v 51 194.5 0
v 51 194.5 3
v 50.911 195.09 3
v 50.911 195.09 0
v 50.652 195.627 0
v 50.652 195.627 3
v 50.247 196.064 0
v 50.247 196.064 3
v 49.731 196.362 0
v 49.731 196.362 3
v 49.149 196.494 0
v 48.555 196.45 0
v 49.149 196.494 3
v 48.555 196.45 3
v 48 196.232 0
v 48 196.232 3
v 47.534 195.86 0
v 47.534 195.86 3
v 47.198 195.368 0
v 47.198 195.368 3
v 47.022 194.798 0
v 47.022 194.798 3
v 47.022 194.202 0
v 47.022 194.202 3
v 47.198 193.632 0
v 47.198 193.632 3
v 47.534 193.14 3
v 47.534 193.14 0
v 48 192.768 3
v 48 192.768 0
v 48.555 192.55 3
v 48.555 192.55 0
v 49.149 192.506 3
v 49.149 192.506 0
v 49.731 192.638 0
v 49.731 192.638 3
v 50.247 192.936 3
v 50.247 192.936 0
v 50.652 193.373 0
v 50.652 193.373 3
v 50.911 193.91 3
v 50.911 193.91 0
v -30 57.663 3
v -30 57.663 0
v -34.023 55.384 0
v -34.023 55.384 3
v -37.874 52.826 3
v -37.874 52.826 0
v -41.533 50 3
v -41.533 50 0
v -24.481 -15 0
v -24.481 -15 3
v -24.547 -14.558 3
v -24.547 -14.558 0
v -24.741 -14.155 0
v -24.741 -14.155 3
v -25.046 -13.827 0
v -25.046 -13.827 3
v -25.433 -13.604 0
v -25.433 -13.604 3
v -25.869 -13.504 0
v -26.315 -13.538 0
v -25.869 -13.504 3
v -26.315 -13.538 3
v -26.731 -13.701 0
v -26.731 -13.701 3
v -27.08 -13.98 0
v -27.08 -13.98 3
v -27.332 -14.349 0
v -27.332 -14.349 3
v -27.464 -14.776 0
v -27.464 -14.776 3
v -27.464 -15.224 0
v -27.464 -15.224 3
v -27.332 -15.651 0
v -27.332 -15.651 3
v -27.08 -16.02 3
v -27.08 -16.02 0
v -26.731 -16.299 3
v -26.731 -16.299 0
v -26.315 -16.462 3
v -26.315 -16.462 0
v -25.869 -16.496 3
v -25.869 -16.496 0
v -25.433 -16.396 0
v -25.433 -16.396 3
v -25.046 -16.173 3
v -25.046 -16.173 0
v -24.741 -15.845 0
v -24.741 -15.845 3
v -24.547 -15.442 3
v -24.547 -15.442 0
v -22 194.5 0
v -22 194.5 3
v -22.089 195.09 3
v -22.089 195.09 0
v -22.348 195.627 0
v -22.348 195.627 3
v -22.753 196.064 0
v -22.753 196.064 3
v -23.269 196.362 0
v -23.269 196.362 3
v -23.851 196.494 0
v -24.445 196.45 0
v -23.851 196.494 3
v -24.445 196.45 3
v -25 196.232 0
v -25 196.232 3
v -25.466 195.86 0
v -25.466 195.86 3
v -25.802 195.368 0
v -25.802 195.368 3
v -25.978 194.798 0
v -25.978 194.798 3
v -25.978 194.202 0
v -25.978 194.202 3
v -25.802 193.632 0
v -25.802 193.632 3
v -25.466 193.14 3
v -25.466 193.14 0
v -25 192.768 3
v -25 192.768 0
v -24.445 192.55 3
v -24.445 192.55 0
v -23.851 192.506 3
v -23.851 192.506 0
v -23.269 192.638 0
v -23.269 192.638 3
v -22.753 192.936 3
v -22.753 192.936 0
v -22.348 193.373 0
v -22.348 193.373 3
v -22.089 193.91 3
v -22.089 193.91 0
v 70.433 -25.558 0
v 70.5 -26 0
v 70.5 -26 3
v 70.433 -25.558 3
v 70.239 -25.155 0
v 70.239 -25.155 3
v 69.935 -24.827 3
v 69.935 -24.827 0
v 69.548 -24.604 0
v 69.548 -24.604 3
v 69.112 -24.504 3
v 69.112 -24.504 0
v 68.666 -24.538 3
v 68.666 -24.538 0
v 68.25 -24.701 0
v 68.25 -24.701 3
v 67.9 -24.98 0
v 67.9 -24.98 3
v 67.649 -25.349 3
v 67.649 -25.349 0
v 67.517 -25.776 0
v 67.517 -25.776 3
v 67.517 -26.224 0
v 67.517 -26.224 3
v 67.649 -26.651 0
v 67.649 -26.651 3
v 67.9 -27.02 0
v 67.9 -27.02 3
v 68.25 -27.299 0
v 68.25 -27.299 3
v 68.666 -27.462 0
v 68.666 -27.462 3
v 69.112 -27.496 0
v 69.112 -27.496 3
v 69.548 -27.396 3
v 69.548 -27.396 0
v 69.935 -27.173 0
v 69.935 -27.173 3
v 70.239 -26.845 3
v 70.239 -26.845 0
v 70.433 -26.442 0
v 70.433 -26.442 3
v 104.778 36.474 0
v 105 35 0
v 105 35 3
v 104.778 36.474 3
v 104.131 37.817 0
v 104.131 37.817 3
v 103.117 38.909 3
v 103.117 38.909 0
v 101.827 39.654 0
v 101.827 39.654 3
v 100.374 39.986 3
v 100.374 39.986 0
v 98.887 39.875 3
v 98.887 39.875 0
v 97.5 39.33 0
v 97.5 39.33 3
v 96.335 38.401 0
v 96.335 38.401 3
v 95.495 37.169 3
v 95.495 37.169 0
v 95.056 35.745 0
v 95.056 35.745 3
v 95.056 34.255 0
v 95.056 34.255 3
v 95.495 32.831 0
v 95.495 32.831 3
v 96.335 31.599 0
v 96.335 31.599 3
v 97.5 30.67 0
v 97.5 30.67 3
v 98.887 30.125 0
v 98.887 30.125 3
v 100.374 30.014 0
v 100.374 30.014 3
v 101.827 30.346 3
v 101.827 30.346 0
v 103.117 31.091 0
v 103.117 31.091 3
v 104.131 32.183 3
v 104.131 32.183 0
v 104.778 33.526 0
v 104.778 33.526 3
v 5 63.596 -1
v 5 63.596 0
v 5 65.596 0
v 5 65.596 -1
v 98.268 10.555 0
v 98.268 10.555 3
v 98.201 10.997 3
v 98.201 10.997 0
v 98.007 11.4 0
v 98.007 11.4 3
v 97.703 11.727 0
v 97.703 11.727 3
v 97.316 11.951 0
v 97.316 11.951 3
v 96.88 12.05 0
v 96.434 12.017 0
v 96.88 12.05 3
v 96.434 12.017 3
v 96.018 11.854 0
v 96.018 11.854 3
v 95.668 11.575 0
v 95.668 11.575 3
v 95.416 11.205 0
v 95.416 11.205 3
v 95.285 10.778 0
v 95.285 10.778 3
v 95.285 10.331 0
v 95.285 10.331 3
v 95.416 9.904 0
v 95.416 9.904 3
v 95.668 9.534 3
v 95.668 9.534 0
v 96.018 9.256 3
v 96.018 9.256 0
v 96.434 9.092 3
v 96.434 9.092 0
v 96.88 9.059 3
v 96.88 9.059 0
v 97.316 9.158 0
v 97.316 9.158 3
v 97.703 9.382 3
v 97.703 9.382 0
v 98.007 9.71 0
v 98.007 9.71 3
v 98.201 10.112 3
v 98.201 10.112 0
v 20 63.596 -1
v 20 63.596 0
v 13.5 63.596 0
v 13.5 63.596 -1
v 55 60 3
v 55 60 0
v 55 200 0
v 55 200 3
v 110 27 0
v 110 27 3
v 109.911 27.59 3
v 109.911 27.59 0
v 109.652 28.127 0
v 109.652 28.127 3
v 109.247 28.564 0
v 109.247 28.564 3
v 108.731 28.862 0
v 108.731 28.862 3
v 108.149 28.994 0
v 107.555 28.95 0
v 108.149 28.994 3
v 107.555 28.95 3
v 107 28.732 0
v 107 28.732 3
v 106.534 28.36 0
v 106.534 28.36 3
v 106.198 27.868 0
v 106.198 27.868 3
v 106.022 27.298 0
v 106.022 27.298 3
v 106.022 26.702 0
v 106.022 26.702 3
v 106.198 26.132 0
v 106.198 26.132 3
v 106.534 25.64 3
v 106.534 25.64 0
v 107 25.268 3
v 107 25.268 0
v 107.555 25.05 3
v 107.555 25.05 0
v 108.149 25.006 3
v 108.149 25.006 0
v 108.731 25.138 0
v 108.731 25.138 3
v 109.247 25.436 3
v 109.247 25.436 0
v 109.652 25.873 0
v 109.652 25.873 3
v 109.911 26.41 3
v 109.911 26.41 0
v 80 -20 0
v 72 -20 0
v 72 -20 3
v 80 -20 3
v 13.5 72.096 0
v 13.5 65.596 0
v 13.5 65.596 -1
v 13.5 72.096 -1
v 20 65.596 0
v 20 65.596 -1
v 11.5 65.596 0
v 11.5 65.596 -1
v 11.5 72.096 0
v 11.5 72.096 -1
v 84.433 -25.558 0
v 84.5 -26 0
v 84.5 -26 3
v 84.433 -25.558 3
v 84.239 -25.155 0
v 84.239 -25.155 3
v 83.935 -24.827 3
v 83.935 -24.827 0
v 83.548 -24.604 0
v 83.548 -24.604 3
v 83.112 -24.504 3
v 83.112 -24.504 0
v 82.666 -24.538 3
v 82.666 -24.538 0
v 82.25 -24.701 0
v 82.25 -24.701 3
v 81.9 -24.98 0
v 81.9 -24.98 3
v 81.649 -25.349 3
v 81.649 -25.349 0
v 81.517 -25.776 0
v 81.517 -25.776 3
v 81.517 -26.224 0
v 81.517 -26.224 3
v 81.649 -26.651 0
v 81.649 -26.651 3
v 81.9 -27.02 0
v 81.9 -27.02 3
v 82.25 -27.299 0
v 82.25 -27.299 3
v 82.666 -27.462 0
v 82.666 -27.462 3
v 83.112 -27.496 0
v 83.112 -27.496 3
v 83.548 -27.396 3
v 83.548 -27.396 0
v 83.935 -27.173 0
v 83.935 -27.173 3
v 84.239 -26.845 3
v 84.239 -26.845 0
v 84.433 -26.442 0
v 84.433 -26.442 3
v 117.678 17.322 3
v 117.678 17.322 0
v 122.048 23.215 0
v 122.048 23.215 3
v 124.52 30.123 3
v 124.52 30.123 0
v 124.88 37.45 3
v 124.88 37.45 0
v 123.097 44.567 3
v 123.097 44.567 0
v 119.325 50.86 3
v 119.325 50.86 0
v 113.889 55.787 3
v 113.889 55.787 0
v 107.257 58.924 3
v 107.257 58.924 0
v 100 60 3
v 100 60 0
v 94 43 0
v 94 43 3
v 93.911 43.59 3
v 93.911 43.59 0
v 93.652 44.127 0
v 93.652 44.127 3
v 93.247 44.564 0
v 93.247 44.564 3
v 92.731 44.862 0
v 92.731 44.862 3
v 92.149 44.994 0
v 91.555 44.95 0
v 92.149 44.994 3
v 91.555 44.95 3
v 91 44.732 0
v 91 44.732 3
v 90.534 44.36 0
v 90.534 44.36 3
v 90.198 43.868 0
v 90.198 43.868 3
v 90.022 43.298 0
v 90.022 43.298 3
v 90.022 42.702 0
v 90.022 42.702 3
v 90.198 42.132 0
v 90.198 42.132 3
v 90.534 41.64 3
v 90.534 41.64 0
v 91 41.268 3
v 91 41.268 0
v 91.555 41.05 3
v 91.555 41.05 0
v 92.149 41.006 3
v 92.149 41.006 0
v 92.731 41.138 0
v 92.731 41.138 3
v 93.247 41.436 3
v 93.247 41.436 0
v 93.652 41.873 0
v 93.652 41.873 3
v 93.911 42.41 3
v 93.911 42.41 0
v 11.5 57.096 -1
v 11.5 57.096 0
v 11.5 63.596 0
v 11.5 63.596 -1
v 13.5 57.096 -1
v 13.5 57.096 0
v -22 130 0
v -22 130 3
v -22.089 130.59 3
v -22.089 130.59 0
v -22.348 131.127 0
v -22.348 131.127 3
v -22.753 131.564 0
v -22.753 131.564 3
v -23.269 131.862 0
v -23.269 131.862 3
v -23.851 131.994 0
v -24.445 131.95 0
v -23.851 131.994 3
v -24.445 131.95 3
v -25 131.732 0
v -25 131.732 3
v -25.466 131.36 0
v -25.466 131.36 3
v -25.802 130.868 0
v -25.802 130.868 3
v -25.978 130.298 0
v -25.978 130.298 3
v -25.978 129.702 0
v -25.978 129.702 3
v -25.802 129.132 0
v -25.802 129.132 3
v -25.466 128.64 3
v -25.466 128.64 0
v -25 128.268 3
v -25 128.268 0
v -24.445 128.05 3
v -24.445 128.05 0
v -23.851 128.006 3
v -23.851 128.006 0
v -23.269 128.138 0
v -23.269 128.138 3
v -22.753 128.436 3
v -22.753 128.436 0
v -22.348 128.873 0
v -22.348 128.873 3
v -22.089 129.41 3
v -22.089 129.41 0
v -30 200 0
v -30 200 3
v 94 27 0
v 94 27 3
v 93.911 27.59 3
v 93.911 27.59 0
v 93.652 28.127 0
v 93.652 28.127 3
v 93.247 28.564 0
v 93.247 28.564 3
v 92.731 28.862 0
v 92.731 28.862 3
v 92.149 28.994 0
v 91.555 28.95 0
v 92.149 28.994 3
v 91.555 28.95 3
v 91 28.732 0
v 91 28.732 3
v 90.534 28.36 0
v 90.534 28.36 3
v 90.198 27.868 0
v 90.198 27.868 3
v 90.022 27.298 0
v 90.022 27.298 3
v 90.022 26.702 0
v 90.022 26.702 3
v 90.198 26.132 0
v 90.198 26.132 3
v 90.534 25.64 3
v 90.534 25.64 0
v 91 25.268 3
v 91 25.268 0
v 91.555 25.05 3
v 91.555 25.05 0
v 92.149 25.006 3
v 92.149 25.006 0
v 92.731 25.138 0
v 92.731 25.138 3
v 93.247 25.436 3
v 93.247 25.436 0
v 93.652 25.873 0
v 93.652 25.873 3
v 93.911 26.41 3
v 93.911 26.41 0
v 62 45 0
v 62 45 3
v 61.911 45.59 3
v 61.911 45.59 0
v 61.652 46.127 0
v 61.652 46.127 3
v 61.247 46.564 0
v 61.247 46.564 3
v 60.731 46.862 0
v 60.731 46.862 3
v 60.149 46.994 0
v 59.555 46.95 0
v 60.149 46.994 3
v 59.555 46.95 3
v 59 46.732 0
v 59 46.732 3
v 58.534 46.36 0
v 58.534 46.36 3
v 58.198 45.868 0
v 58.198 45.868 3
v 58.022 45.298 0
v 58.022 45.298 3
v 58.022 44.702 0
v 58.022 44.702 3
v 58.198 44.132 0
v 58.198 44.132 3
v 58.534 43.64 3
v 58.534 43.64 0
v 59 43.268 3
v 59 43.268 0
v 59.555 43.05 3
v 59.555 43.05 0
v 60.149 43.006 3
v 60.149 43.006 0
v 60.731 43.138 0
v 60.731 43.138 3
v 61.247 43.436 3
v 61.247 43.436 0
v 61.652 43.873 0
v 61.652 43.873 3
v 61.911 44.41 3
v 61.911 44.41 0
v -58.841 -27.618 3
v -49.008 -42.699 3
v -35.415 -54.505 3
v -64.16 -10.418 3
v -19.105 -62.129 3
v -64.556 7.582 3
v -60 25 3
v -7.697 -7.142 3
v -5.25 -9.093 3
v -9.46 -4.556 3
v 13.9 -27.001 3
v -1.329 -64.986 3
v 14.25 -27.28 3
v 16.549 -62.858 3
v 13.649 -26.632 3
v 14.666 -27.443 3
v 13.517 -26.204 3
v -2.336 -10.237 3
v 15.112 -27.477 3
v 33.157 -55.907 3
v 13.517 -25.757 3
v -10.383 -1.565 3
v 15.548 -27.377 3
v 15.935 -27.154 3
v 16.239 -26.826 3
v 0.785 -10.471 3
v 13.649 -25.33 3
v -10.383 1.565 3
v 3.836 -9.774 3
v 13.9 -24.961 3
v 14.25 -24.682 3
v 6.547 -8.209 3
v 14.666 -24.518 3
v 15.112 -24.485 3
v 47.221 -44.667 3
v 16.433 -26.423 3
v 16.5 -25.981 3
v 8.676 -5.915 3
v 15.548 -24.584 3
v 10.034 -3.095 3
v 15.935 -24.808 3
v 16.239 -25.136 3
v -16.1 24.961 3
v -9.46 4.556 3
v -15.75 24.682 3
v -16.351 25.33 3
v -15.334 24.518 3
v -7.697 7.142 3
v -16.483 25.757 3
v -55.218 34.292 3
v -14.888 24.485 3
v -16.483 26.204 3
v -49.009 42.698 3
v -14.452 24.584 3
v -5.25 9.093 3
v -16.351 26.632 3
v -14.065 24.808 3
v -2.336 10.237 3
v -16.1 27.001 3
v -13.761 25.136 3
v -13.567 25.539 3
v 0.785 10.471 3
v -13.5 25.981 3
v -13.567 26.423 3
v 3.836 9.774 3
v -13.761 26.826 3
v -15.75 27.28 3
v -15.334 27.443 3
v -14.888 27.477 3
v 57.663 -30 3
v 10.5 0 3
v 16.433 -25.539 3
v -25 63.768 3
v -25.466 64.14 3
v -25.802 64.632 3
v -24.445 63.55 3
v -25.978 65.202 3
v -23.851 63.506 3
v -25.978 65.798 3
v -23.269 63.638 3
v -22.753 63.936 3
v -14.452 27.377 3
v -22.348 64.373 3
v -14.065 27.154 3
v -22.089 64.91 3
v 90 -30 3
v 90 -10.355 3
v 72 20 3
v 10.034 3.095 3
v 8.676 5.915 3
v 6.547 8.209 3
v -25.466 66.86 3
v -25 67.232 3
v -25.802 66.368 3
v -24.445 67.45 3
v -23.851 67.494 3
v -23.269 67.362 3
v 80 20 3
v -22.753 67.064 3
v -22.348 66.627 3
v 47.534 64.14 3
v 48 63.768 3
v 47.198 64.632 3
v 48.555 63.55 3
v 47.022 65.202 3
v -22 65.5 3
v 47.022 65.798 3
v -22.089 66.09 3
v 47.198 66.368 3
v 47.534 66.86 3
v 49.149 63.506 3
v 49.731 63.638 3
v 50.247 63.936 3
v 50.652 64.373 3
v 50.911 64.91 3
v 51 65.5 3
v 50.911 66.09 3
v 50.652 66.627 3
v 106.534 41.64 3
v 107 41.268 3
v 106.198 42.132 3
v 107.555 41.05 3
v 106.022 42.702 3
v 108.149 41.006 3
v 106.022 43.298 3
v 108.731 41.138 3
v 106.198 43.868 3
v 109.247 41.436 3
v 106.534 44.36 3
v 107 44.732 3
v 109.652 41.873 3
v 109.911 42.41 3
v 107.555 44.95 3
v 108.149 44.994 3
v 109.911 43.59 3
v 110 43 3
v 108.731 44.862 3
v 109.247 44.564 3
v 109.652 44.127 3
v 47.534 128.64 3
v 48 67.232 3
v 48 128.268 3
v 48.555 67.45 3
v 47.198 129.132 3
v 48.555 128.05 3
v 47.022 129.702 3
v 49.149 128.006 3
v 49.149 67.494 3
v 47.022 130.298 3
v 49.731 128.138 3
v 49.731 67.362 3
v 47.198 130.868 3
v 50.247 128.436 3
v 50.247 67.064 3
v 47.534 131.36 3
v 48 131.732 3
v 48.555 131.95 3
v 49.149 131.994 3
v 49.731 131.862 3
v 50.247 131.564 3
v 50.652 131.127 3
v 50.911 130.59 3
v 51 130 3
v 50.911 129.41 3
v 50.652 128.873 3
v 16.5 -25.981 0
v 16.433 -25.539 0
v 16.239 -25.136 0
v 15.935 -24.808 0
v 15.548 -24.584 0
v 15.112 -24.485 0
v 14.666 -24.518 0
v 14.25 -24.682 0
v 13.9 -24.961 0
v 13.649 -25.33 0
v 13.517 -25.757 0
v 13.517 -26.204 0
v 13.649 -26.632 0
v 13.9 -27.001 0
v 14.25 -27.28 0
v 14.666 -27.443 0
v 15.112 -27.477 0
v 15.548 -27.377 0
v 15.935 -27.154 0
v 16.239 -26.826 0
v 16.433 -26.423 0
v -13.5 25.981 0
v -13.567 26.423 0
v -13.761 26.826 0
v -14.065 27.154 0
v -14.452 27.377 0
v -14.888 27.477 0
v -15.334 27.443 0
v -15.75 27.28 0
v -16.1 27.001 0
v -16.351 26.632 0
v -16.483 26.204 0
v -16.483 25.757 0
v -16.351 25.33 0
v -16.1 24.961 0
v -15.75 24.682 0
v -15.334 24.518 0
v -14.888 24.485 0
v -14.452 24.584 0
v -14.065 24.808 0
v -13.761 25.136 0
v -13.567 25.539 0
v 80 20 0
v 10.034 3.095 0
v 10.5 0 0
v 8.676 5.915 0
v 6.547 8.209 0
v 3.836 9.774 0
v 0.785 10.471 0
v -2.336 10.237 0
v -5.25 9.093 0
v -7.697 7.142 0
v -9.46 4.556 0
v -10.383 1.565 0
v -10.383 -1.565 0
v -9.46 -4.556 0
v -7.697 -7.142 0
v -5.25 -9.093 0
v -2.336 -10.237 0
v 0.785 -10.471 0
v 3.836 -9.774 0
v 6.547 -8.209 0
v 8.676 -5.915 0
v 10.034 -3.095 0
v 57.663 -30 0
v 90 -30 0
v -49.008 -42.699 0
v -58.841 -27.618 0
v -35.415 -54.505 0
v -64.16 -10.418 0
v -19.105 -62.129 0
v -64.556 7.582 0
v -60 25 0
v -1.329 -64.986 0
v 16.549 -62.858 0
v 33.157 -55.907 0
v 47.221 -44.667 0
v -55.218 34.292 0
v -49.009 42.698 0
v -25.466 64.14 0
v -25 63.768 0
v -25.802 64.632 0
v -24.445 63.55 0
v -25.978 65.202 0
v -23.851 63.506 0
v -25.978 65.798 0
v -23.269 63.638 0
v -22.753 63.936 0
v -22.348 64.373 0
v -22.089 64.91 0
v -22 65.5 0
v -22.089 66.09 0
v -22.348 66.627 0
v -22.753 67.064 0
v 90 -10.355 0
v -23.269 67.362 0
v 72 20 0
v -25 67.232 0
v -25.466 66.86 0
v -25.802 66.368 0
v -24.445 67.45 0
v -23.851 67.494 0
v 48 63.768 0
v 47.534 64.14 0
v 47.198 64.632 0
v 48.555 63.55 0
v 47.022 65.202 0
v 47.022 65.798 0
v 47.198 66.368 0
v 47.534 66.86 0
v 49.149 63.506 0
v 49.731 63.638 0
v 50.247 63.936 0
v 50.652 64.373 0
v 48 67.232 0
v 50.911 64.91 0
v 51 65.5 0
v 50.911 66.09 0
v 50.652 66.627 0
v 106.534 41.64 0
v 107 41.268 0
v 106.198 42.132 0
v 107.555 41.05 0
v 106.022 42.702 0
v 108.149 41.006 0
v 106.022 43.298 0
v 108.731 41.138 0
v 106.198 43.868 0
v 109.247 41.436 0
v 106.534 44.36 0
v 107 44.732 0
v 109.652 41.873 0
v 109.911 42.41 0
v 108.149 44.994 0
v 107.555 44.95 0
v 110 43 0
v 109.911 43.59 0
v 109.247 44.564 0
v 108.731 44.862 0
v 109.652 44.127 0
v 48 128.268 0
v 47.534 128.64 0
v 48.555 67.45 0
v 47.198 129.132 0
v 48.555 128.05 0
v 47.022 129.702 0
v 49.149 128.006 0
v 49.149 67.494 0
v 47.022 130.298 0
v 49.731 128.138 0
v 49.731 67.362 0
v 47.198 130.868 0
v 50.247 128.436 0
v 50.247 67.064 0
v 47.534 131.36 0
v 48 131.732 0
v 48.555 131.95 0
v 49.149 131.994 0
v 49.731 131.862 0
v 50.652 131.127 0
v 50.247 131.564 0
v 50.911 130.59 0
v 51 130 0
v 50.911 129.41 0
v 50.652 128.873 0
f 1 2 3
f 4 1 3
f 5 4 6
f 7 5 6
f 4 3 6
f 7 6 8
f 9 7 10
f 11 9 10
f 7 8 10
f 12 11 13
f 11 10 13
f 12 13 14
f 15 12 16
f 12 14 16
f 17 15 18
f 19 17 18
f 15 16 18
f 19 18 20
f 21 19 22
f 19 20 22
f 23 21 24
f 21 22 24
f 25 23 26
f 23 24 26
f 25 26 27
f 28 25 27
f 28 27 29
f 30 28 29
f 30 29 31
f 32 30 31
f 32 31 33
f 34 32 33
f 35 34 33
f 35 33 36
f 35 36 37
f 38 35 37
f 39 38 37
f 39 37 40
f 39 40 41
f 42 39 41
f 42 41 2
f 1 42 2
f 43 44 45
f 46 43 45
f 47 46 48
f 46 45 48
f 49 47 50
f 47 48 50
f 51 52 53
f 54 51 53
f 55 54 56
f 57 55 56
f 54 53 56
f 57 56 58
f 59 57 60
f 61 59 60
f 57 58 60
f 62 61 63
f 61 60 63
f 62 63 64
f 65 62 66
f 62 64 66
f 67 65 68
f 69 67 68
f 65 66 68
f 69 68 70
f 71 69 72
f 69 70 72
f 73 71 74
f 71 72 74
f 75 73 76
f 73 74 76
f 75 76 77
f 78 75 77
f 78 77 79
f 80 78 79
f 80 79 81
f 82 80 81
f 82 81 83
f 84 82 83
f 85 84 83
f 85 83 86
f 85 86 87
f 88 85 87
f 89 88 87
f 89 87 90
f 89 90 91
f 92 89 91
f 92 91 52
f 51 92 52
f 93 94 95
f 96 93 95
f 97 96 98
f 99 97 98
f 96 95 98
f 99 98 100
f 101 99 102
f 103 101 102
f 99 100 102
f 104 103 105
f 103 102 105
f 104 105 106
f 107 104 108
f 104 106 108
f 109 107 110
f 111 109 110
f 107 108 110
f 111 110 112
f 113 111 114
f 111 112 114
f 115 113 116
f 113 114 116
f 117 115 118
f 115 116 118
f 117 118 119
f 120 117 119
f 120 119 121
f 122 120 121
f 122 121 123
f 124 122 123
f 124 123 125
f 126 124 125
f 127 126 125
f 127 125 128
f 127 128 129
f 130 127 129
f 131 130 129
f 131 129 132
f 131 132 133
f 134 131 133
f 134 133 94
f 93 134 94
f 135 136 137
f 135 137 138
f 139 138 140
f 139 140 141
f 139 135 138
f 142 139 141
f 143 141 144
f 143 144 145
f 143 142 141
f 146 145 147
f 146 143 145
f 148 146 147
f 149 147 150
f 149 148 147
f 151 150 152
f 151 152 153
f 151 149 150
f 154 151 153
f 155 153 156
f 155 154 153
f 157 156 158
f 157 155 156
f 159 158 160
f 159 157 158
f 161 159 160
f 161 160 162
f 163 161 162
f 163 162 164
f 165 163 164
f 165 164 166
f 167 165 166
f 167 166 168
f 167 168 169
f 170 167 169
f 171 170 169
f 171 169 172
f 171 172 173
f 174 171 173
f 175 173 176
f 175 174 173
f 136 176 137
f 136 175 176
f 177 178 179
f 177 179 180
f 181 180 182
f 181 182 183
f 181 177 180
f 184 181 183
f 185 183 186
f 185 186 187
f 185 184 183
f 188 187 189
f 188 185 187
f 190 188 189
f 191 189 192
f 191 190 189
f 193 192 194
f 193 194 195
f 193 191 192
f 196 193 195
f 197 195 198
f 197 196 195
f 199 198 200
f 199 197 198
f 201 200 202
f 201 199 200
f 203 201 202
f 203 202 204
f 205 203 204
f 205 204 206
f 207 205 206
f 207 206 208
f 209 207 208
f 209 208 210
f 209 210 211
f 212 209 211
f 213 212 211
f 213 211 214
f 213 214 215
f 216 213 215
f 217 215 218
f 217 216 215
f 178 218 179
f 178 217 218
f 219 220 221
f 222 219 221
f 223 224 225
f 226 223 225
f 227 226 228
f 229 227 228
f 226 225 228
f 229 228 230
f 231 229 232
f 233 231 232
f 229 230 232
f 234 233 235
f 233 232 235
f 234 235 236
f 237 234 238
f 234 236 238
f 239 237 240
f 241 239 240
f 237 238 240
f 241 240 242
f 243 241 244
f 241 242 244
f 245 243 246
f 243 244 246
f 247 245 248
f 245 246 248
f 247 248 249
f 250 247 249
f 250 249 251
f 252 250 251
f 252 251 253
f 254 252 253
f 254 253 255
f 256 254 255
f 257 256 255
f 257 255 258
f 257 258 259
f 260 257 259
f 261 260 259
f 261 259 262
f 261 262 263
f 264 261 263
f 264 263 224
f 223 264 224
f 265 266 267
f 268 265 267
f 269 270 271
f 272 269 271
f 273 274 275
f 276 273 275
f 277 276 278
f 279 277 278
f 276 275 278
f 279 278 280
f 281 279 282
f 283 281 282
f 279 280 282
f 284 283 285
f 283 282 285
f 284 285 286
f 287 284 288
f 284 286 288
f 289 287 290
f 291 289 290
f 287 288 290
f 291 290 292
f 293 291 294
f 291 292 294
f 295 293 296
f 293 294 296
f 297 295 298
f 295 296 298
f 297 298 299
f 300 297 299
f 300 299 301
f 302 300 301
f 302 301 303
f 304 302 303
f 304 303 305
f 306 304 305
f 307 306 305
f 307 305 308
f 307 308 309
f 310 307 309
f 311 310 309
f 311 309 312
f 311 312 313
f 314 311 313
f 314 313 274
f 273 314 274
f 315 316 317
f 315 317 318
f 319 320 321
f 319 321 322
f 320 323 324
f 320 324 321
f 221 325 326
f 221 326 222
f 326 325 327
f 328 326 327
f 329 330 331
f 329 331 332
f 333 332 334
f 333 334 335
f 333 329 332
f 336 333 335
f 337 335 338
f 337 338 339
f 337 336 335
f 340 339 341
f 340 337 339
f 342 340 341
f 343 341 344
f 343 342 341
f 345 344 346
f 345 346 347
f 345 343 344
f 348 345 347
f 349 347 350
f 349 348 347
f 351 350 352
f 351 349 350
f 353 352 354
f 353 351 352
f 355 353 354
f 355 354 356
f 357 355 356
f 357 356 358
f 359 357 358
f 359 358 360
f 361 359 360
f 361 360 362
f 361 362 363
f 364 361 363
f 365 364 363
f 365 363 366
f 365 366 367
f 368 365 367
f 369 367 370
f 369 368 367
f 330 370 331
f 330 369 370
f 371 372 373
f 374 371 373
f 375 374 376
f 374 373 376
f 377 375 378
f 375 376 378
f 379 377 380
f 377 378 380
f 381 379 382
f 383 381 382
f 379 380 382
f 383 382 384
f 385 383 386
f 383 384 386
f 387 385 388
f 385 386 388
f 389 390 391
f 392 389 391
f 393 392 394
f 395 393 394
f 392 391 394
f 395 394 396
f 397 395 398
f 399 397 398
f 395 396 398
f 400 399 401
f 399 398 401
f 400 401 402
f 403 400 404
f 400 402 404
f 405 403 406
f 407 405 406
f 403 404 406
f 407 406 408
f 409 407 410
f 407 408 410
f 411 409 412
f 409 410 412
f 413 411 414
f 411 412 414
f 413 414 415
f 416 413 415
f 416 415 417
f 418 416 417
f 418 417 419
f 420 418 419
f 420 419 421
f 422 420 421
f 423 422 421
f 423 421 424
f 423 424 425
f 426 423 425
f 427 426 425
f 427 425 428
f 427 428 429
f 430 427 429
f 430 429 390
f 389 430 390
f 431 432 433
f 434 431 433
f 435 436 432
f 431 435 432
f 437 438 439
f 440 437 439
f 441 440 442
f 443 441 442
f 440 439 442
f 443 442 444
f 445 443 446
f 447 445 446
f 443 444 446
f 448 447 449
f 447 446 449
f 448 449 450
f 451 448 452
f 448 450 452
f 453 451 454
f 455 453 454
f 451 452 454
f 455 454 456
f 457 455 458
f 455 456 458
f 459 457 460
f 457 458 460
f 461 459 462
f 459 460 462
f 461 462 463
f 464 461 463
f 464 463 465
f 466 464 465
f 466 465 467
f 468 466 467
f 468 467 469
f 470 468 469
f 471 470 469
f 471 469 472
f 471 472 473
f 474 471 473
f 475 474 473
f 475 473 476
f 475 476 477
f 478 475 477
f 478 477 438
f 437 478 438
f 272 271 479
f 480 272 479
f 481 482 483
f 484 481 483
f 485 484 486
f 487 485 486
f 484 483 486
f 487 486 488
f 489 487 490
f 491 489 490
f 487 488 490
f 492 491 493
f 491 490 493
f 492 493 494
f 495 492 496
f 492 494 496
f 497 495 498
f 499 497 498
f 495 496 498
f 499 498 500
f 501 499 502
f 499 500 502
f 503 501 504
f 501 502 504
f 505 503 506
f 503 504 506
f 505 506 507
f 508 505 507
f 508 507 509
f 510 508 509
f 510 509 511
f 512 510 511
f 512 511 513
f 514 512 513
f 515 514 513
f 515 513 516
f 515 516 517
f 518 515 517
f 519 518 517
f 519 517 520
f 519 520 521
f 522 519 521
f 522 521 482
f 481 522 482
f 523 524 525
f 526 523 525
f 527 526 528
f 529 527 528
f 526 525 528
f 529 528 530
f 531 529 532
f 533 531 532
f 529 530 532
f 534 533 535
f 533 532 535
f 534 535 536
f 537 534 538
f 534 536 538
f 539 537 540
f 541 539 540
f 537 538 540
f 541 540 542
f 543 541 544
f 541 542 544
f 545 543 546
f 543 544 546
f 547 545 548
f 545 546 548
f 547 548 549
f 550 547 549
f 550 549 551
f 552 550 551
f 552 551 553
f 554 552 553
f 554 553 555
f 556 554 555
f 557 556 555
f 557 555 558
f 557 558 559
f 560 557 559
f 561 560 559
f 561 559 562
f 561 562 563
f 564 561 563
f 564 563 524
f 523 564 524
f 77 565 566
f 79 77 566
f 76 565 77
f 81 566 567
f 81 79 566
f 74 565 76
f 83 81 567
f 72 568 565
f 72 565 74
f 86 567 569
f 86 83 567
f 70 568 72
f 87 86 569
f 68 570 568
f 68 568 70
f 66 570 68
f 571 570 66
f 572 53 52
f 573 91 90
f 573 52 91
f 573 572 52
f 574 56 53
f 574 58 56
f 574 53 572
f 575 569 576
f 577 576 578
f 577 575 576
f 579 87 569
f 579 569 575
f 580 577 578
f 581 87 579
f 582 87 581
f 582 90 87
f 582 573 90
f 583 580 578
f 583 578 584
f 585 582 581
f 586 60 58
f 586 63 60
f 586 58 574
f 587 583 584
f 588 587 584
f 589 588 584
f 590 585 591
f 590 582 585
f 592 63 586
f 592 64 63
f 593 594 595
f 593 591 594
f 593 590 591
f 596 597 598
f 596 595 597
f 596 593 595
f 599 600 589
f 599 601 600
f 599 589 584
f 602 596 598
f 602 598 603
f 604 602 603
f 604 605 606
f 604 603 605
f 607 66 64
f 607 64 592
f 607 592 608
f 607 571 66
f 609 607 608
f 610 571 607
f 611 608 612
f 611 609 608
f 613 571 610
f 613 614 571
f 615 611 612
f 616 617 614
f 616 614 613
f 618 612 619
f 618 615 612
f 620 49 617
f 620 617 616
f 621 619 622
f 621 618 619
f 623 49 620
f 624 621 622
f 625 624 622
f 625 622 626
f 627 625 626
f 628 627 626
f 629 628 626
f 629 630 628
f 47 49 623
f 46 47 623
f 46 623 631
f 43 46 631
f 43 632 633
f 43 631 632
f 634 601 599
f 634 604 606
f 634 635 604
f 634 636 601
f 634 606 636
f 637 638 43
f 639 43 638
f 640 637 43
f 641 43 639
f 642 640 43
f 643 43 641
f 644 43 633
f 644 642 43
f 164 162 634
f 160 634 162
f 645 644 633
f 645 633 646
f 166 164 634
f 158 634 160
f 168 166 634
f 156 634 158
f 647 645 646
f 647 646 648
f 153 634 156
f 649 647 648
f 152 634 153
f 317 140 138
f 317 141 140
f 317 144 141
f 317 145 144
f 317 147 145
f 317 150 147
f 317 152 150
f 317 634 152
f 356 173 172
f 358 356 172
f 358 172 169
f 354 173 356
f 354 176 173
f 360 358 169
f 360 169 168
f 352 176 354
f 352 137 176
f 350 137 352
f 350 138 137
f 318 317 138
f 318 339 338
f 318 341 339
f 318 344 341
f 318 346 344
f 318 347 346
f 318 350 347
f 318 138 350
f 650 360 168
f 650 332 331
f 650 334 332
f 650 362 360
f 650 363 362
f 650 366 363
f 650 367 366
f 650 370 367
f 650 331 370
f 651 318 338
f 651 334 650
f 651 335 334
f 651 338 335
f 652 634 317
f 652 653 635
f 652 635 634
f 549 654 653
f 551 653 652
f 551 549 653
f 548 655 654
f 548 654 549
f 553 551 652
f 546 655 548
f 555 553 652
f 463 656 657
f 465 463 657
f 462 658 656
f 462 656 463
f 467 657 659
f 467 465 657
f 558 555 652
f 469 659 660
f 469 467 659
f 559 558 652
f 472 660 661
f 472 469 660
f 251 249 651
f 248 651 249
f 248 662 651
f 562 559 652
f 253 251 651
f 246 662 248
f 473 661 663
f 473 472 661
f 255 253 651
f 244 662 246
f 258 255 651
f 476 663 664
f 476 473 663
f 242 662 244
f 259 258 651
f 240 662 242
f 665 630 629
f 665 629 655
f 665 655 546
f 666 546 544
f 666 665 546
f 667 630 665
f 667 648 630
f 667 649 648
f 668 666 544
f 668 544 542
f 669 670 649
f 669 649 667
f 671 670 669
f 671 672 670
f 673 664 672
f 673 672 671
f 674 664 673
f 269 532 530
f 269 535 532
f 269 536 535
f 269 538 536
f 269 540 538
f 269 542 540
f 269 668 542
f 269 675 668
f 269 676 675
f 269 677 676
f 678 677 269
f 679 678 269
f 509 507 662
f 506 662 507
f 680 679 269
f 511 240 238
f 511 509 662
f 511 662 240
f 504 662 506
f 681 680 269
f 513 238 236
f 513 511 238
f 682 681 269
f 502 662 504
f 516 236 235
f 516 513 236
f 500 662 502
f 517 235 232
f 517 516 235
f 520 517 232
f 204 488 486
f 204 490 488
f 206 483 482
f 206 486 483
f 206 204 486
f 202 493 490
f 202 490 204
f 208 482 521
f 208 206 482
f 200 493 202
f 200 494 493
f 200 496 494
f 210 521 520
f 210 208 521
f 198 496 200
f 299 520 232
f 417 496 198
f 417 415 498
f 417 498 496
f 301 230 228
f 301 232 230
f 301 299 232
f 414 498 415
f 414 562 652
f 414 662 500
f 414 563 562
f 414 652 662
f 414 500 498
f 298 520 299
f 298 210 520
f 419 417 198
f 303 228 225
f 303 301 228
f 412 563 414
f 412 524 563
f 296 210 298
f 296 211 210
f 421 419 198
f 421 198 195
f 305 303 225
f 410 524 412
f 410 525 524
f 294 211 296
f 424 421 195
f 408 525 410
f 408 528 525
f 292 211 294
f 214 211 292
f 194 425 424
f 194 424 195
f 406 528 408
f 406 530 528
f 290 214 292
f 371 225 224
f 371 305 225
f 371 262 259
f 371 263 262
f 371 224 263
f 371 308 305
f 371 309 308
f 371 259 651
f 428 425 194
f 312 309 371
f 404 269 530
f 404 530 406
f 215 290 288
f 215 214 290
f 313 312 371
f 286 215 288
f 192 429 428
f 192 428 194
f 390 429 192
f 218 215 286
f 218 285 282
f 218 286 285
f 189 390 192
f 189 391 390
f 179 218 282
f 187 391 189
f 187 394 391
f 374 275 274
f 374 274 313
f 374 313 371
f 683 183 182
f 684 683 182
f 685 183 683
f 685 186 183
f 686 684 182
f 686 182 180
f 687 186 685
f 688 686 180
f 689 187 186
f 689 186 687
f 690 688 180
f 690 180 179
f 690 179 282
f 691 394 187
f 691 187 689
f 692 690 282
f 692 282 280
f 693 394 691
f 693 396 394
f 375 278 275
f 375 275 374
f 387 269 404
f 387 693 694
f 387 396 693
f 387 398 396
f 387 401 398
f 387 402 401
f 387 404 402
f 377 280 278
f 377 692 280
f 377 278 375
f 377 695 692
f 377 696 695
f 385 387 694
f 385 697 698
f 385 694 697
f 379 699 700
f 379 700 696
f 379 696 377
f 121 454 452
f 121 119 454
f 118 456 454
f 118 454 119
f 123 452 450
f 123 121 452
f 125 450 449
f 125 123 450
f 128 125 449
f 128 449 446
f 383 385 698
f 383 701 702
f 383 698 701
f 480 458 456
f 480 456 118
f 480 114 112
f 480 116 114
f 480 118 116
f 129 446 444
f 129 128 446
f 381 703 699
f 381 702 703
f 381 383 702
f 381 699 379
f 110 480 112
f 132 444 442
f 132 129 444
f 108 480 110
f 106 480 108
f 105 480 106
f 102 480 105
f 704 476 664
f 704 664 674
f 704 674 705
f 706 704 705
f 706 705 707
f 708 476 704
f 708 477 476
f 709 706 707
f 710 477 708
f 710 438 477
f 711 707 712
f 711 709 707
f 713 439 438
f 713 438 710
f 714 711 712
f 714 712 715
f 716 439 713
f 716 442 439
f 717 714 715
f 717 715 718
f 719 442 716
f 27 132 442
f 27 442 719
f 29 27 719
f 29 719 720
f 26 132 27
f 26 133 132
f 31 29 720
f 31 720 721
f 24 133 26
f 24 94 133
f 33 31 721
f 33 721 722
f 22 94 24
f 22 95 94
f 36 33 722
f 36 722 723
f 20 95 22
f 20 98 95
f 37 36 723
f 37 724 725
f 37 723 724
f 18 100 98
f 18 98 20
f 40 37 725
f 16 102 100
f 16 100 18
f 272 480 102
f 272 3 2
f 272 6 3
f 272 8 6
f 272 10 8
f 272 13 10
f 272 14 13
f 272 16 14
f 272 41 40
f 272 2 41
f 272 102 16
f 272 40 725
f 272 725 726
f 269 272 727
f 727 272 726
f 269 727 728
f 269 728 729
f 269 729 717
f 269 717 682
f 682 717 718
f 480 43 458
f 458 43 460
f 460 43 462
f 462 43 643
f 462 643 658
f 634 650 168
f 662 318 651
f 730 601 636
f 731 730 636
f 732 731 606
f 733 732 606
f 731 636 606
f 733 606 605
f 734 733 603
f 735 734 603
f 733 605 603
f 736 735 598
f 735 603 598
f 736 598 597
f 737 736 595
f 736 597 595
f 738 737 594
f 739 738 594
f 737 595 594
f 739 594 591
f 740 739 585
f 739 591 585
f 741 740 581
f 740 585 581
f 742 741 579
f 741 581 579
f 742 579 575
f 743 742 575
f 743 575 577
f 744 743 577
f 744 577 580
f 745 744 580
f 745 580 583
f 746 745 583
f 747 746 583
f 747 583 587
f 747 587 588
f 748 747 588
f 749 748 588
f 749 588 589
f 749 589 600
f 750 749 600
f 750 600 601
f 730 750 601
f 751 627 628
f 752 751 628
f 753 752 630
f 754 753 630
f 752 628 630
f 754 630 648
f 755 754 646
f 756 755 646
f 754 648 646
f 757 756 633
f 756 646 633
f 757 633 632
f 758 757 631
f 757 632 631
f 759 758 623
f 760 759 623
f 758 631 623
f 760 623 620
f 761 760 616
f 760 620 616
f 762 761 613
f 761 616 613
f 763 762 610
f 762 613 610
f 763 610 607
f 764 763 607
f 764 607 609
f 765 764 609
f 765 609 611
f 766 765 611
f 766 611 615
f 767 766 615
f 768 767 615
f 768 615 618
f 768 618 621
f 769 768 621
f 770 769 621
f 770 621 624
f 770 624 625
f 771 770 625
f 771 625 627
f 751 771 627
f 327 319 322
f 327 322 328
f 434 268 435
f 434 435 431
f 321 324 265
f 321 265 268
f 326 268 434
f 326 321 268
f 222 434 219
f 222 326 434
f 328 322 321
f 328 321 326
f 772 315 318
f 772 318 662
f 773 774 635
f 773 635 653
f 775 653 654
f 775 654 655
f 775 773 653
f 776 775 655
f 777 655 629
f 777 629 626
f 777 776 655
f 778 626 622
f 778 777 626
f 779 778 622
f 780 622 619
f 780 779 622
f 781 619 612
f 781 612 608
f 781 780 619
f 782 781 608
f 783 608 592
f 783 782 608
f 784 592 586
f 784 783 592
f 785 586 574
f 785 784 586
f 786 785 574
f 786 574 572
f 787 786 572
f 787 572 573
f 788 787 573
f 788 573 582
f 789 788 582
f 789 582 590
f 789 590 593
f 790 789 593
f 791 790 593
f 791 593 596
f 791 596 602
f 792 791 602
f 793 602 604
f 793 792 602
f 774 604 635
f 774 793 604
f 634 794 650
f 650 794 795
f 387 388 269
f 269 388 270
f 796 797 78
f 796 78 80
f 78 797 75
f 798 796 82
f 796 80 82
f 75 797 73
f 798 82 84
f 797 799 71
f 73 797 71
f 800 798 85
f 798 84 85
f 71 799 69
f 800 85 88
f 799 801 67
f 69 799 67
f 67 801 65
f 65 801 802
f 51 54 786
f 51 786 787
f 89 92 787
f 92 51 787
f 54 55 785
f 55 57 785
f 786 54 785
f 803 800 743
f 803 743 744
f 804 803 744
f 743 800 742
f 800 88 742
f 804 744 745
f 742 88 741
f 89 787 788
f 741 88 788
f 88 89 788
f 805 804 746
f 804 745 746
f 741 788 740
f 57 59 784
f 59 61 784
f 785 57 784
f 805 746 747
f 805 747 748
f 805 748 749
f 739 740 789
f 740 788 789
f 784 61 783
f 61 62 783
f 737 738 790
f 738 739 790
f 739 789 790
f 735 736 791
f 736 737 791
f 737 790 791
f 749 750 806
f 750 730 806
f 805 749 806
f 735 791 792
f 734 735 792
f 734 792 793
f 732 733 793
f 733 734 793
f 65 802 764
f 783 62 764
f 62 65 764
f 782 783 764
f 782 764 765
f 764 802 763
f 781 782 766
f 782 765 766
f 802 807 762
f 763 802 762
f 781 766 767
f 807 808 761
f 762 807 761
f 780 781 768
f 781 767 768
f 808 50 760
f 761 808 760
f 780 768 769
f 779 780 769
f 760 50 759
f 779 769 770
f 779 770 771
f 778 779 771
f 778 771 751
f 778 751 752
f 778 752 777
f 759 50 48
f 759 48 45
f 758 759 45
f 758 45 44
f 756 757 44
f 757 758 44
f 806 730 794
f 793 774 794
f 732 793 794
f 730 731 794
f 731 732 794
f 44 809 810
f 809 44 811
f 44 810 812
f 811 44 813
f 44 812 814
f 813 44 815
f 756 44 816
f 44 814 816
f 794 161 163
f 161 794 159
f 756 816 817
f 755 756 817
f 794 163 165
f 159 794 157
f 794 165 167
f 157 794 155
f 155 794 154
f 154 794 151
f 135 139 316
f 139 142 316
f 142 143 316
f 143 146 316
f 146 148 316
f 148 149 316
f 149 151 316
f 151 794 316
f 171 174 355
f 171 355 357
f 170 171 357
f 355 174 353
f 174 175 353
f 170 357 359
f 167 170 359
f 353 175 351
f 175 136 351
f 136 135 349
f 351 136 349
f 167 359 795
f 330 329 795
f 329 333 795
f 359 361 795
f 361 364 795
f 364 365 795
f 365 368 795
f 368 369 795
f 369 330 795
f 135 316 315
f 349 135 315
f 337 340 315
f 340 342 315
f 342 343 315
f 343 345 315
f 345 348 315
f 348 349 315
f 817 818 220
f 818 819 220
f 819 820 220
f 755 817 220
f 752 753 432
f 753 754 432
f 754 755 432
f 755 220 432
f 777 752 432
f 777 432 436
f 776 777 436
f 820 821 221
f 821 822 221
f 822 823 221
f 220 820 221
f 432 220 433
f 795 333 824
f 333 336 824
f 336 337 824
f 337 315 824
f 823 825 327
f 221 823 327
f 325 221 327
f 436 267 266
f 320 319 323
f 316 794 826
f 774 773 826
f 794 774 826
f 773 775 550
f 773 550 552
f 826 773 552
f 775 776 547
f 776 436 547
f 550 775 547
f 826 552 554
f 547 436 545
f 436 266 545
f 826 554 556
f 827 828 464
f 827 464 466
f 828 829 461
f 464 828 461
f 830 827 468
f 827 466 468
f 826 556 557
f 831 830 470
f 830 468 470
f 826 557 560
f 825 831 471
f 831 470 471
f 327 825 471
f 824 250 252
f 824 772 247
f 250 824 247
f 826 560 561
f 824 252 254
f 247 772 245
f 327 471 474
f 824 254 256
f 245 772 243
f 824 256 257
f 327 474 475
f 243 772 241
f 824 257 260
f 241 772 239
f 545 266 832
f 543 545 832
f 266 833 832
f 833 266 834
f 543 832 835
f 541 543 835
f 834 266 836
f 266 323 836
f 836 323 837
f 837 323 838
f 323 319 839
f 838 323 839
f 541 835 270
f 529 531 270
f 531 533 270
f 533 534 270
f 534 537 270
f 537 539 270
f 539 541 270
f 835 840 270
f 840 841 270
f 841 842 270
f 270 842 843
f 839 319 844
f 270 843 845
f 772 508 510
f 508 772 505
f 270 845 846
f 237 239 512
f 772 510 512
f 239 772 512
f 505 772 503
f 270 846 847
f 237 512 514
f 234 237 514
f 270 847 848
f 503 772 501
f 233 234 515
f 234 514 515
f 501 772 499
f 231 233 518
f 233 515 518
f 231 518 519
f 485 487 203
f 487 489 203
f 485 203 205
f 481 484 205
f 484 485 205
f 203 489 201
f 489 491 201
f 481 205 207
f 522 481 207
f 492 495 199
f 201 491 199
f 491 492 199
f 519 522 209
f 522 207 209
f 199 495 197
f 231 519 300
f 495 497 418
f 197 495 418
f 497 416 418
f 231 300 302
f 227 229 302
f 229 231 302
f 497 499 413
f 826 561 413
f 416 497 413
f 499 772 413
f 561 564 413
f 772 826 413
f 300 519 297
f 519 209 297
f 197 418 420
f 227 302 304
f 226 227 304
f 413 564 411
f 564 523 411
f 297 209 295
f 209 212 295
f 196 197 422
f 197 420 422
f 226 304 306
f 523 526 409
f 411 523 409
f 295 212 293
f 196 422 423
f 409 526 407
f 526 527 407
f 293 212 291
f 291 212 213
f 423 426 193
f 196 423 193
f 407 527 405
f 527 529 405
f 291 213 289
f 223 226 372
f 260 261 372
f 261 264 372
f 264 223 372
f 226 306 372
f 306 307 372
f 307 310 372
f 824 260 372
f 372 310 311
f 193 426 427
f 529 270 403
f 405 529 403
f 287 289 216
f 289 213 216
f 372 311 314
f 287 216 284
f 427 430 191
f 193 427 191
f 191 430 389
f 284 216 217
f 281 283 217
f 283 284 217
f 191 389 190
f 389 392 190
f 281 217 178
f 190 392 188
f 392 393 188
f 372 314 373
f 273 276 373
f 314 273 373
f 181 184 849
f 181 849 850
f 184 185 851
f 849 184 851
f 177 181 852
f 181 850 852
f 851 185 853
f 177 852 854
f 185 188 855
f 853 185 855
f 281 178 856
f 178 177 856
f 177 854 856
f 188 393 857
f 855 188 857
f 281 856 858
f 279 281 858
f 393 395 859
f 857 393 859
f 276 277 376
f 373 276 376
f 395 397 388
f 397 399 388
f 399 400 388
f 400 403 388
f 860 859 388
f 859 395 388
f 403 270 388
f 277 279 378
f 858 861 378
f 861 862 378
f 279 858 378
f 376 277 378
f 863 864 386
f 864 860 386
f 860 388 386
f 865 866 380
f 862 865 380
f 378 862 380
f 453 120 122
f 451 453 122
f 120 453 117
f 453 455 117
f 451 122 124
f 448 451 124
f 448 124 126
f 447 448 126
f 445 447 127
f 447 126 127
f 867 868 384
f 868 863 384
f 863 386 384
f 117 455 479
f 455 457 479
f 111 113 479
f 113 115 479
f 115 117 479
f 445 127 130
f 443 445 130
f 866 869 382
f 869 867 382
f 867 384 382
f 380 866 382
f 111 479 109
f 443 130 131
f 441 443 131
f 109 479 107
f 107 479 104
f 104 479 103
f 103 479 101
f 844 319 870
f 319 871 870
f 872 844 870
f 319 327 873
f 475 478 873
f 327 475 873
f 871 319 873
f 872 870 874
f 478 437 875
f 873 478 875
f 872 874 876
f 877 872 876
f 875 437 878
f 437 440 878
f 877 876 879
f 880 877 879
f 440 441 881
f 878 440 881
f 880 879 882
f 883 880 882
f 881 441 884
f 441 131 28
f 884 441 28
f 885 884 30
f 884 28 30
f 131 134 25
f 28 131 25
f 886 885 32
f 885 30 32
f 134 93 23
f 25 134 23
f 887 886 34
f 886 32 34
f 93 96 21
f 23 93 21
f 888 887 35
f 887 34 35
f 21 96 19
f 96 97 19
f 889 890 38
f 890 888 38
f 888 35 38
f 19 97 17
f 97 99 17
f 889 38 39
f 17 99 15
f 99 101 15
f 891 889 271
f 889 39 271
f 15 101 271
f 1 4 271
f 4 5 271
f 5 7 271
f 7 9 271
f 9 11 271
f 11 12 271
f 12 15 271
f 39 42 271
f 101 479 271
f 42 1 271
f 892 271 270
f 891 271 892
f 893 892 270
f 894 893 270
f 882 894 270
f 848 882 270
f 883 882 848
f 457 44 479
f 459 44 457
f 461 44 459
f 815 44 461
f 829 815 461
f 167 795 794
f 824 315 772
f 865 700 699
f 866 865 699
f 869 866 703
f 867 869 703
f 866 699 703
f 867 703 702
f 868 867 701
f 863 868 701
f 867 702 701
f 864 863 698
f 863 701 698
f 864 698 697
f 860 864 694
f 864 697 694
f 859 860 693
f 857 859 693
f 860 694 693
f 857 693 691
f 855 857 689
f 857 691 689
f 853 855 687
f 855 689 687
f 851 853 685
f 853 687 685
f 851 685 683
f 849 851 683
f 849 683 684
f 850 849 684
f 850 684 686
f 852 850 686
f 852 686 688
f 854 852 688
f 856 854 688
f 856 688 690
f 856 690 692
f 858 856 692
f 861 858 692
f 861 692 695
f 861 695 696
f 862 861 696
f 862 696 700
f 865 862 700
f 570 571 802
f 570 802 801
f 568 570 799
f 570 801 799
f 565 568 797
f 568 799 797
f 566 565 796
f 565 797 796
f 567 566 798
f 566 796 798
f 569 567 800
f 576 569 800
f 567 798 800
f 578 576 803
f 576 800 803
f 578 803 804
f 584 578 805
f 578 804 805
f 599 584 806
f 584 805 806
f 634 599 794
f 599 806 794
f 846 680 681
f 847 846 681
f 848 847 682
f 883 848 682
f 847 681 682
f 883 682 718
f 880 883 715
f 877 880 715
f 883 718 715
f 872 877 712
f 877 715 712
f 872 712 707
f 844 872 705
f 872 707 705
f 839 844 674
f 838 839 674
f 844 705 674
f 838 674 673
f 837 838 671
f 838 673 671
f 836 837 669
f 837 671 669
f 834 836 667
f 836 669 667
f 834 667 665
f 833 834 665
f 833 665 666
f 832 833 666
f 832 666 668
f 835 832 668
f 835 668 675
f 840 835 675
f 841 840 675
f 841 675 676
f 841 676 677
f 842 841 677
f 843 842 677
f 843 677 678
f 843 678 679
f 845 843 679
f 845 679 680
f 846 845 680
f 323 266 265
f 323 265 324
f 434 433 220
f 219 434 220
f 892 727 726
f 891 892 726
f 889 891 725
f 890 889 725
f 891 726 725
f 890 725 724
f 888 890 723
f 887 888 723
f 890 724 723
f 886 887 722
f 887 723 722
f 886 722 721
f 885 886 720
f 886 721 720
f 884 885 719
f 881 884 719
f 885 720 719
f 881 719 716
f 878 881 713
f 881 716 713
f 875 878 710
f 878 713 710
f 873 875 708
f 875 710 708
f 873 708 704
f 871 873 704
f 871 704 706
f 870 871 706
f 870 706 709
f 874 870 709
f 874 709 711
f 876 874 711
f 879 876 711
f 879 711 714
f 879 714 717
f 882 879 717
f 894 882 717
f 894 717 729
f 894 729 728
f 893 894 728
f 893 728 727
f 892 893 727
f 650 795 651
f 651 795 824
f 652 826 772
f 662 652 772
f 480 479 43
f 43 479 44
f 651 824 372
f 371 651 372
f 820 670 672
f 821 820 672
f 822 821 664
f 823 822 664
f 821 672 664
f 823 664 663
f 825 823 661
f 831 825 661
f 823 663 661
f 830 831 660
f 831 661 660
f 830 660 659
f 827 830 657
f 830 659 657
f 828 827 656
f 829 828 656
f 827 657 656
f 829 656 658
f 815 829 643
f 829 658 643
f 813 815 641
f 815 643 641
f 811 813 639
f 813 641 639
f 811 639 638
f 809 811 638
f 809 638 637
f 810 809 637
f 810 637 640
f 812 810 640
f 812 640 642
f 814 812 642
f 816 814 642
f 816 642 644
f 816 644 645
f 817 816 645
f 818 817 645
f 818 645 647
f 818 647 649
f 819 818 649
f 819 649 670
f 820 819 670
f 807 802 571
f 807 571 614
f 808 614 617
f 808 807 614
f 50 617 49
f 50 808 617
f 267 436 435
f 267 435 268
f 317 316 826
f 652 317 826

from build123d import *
from build123d.topology import SkipClean

# Parameters (mm, degrees)
SKETCH1_R           = 10.5
SKETCH1_R_2         = 1.5
SKETCH1_W           = 8
SKETCH1_H           = 40
SKETCH1_R_3         = 5
BOSS_EXTRUDE1_DEPTH = 3
CUT_EXTRUDE1_REACH  = 140.687
SKETCH2_R           = 2
BOSS_EXTRUDE2_DEPTH = 3
SKETCH4_W           = 2
SKETCH4_H           = 6.5
SKETCH4_W_2         = 6.5
SKETCH4_H_2         = 2
BOSS_EXTRUDE3_DEPTH = 1
SKETCH5_R           = 2
CUT_EXTRUDE2_DEPTH  = 10
BOSS_EXTRUDE4_START = -3
BOSS_EXTRUDE4_DEPTH = 3
SKETCH7_R           = 2
CUT_EXTRUDE3_DEPTH  = 10
BOSS_EXTRUDE5_START = -3
SKETCH8_R           = 65
SKETCH8_R_2         = 10.5
BOSS_EXTRUDE5_DEPTH = 3
CUT_EXTRUDE4_START  = -10
CUT_EXTRUDE4_DEPTH  = 10
CUT_EXTRUDE5_REACH  = 237.883
SKETCH10_R          = 1.5


with BuildPart() as part:
    # Sketch1 → Boss-Extrude1 (new body)
    # profile 1 of 2: a face of its own
    with BuildSketch(Plane.XY):
        with BuildLine():
            ThreePointArc((-60, 0), (-52.867640737, 28.372743309), (-33.166247904, 50))
            Line((-33.166247904, 50), (-60, 50))
            Line((-60, 50), (-60, 0))
        make_face()
    # profile 2 of 2: a face of its own
    with BuildSketch(Plane.XY):
        with BuildLine():
            ThreePointArc((0, 60), (-17.320508076, 57.445626465), (-33.166247904, 50))
            ThreePointArc((-33.166247904, 50), (-52.867640737, 28.372743309), (-60, 0))
            ThreePointArc((-60, 0), (-15.529142706, -57.955549577), (51.961524227, -30))
            Line((51.961524227, -30), (56.882127578, -30))
            Line((56.882127578, -30), (90, -30))
            Line((90, -30), (90, -10.355339059))
            Line((90, -10.355339059), (117.67766953, 17.32233047))
            ThreePointArc((117.67766953, 17.32233047), (123.096988313, 44.567085809), (100, 60))
            Line((100, 60), (0, 60))
        make_face()
        Circle(SKETCH1_R, mode=Mode.SUBTRACT)
        with Locations((69, -26)):
            Circle(SKETCH1_R_2, mode=Mode.SUBTRACT)
        with Locations((76, 0)):
            Rectangle(SKETCH1_W, SKETCH1_H, mode=Mode.SUBTRACT)
        with Locations((83, -26)):
            Circle(SKETCH1_R_2, mode=Mode.SUBTRACT)
        with Locations((100, 35)):
            Circle(SKETCH1_R_3, mode=Mode.SUBTRACT)
    extrude(amount=BOSS_EXTRUDE1_DEPTH)

    # Sketch2 → Cut-Extrude1 (cut, up to next)
    with BuildSketch(Plane.XY.offset(3), mode=Mode.PRIVATE) as cut_extrude1_sk1:
        with Locations((60, 45)):
            Circle(SKETCH2_R)
    cut_extrude1_tool1 = extrude(cut_extrude1_sk1.sketch, amount=-CUT_EXTRUDE1_REACH, mode=Mode.PRIVATE) & part.part
    add(cut_extrude1_tool1.solids().sort_by_distance((60, 45, 3))[0], mode=Mode.SUBTRACT)

    # Sketch3 → Boss-Extrude2 (add)
    with BuildSketch(Plane(origin=(0, 0, 0), x_dir=(-1, 0, 0), z_dir=(0, 0, -1))):
        with BuildLine():
            Line((-30, 80), (-30, 60))
            Line((-30, 60), (0, 60))
            ThreePointArc((0, 60), (2.502176759, 59.947803225), (5, 59.791303716))
            Line((5, 59.791303716), (5, 80))
            Line((5, 80), (-30, 80))
        make_face()
    extrude(amount=-BOSS_EXTRUDE2_DEPTH)

    # Sketch4 → Boss-Extrude3 (add)
    with BuildSketch(Plane(origin=(0, 0, 0), x_dir=(-1, 0, 0), z_dir=(0, 0, -1))):
        with Locations((-12.5, 68.846087829)):
            Rectangle(SKETCH4_W, SKETCH4_H)
        with Locations((-16.75, 64.596087829)):
            Rectangle(SKETCH4_W_2, SKETCH4_H_2)
        with Locations((-12.5, 64.596087829)):
            Rectangle(SKETCH4_W, SKETCH4_H_2)
        with Locations((-8.25, 64.596087829)):
            Rectangle(SKETCH4_W_2, SKETCH4_H_2)
        with Locations((-12.5, 60.346087829)):
            Rectangle(SKETCH4_W, SKETCH4_H)
    extrude(amount=BOSS_EXTRUDE3_DEPTH)

    # Sketch5 → Cut-Extrude2 (cut)
    with BuildSketch(Plane.XY.offset(3)):
        with Locations((92, 43)):
            Circle(SKETCH5_R)
        with Locations((108, 43)):
            Circle(SKETCH5_R)
        with Locations((108, 27)):
            Circle(SKETCH5_R)
        with Locations((92, 27)):
            Circle(SKETCH5_R)
    extrude(amount=-CUT_EXTRUDE2_DEPTH, mode=Mode.SUBTRACT)

    # Sketch6 → Boss-Extrude4 (add)
    with BuildSketch(Plane.XY.offset(3).offset(BOSS_EXTRUDE4_START)):
        with BuildLine():
            Line((12.5, 60), (55, 60))
            Line((55, 60), (55, 200))
            Line((55, 200), (-30, 200))
            Line((-30, 200), (-30, 60))
            Line((-30, 60), (-30, 51.961524227))
            ThreePointArc((-30, 51.961524227), (-17.93255034, 57.257520364), (-5, 59.791303716))
            Line((-5, 59.791303716), (-5, 60))
            Line((-5, 60), (12.5, 60))
        make_face()
    extrude(amount=BOSS_EXTRUDE4_DEPTH)

    # Sketch7 → Cut-Extrude3 (cut)
    with BuildSketch(Plane.XY.offset(3)):
        with Locations((-24, 194.5)):
            Circle(SKETCH7_R)
        with Locations((49, 194.5)):
            Circle(SKETCH7_R)
        with Locations((49, 65.5)):
            Circle(SKETCH7_R)
        with Locations((-24, 65.5)):
            Circle(SKETCH7_R)
        with Locations((-24, 130)):
            Circle(SKETCH7_R)
        with Locations((49, 130)):
            Circle(SKETCH7_R)
    extrude(amount=-CUT_EXTRUDE3_DEPTH, mode=Mode.SUBTRACT)

    # Sketch8 → Boss-Extrude5 (add)
    with BuildSketch(Plane.XY.offset(3).offset(BOSS_EXTRUDE5_START)):
        Circle(SKETCH8_R)
        Circle(SKETCH8_R_2, mode=Mode.SUBTRACT)
    extrude(amount=BOSS_EXTRUDE5_DEPTH)

    # Sketch9 → Cut-Extrude4 (cut)
    with SkipClean():  # the faces are left unmerged after this step: merging them gives an invalid solid
        with BuildSketch(Plane.XY.offset(3).offset(CUT_EXTRUDE4_START)):
            with BuildLine():
                Line((-60, 50), (-60, 25))
                ThreePointArc((-60, 25), (-52.282822987, 38.62002616), (-41.533119315, 50))
                Line((-41.533119315, 50), (-60, 50))
            make_face()
        extrude(amount=CUT_EXTRUDE4_DEPTH, mode=Mode.SUBTRACT)

    # Sketch10 → Cut-Extrude5 (cut, up to next)
    with BuildSketch(Plane.XY.offset(3), mode=Mode.PRIVATE) as cut_extrude5_sk1:
        with Locations((-15, 25.980762114)):
            Circle(SKETCH10_R)
    cut_extrude5_tool1 = extrude(cut_extrude5_sk1.sketch, amount=-CUT_EXTRUDE5_REACH, mode=Mode.PRIVATE) & part.part
    # Sketch10 → Cut-Extrude5 (cut, up to next)
    with BuildSketch(Plane.XY.offset(3), mode=Mode.PRIVATE) as cut_extrude5_sk2:
        with Locations((-25.980762114, -15)):
            Circle(SKETCH10_R)
    cut_extrude5_tool2 = extrude(cut_extrude5_sk2.sketch, amount=-CUT_EXTRUDE5_REACH, mode=Mode.PRIVATE) & part.part
    # Sketch10 → Cut-Extrude5 (cut, up to next)
    with BuildSketch(Plane.XY.offset(3), mode=Mode.PRIVATE) as cut_extrude5_sk3:
        with Locations((15, -25.980762114)):
            Circle(SKETCH10_R)
    cut_extrude5_tool3 = extrude(cut_extrude5_sk3.sketch, amount=-CUT_EXTRUDE5_REACH, mode=Mode.PRIVATE) & part.part
    # Sketch10 → Cut-Extrude5 (cut, up to next)
    with BuildSketch(Plane.XY.offset(3), mode=Mode.PRIVATE) as cut_extrude5_sk4:
        with Locations((96.767766953, 10.554563517)):
            Circle(SKETCH10_R)
    cut_extrude5_tool4 = extrude(cut_extrude5_sk4.sketch, amount=-CUT_EXTRUDE5_REACH, mode=Mode.PRIVATE) & part.part
    add(cut_extrude5_tool1.solids().sort_by_distance((-15, 25.980762, 3))[0], mode=Mode.SUBTRACT)
    add(cut_extrude5_tool2.solids().sort_by_distance((-25.980762, -15, 3))[0], mode=Mode.SUBTRACT)
    add(cut_extrude5_tool3.solids().sort_by_distance((15, -25.980762, 3))[0], mode=Mode.SUBTRACT)
    add(cut_extrude5_tool4.solids().sort_by_distance((96.767767, 10.554564, 3))[0], mode=Mode.SUBTRACT)


solid = part.part
